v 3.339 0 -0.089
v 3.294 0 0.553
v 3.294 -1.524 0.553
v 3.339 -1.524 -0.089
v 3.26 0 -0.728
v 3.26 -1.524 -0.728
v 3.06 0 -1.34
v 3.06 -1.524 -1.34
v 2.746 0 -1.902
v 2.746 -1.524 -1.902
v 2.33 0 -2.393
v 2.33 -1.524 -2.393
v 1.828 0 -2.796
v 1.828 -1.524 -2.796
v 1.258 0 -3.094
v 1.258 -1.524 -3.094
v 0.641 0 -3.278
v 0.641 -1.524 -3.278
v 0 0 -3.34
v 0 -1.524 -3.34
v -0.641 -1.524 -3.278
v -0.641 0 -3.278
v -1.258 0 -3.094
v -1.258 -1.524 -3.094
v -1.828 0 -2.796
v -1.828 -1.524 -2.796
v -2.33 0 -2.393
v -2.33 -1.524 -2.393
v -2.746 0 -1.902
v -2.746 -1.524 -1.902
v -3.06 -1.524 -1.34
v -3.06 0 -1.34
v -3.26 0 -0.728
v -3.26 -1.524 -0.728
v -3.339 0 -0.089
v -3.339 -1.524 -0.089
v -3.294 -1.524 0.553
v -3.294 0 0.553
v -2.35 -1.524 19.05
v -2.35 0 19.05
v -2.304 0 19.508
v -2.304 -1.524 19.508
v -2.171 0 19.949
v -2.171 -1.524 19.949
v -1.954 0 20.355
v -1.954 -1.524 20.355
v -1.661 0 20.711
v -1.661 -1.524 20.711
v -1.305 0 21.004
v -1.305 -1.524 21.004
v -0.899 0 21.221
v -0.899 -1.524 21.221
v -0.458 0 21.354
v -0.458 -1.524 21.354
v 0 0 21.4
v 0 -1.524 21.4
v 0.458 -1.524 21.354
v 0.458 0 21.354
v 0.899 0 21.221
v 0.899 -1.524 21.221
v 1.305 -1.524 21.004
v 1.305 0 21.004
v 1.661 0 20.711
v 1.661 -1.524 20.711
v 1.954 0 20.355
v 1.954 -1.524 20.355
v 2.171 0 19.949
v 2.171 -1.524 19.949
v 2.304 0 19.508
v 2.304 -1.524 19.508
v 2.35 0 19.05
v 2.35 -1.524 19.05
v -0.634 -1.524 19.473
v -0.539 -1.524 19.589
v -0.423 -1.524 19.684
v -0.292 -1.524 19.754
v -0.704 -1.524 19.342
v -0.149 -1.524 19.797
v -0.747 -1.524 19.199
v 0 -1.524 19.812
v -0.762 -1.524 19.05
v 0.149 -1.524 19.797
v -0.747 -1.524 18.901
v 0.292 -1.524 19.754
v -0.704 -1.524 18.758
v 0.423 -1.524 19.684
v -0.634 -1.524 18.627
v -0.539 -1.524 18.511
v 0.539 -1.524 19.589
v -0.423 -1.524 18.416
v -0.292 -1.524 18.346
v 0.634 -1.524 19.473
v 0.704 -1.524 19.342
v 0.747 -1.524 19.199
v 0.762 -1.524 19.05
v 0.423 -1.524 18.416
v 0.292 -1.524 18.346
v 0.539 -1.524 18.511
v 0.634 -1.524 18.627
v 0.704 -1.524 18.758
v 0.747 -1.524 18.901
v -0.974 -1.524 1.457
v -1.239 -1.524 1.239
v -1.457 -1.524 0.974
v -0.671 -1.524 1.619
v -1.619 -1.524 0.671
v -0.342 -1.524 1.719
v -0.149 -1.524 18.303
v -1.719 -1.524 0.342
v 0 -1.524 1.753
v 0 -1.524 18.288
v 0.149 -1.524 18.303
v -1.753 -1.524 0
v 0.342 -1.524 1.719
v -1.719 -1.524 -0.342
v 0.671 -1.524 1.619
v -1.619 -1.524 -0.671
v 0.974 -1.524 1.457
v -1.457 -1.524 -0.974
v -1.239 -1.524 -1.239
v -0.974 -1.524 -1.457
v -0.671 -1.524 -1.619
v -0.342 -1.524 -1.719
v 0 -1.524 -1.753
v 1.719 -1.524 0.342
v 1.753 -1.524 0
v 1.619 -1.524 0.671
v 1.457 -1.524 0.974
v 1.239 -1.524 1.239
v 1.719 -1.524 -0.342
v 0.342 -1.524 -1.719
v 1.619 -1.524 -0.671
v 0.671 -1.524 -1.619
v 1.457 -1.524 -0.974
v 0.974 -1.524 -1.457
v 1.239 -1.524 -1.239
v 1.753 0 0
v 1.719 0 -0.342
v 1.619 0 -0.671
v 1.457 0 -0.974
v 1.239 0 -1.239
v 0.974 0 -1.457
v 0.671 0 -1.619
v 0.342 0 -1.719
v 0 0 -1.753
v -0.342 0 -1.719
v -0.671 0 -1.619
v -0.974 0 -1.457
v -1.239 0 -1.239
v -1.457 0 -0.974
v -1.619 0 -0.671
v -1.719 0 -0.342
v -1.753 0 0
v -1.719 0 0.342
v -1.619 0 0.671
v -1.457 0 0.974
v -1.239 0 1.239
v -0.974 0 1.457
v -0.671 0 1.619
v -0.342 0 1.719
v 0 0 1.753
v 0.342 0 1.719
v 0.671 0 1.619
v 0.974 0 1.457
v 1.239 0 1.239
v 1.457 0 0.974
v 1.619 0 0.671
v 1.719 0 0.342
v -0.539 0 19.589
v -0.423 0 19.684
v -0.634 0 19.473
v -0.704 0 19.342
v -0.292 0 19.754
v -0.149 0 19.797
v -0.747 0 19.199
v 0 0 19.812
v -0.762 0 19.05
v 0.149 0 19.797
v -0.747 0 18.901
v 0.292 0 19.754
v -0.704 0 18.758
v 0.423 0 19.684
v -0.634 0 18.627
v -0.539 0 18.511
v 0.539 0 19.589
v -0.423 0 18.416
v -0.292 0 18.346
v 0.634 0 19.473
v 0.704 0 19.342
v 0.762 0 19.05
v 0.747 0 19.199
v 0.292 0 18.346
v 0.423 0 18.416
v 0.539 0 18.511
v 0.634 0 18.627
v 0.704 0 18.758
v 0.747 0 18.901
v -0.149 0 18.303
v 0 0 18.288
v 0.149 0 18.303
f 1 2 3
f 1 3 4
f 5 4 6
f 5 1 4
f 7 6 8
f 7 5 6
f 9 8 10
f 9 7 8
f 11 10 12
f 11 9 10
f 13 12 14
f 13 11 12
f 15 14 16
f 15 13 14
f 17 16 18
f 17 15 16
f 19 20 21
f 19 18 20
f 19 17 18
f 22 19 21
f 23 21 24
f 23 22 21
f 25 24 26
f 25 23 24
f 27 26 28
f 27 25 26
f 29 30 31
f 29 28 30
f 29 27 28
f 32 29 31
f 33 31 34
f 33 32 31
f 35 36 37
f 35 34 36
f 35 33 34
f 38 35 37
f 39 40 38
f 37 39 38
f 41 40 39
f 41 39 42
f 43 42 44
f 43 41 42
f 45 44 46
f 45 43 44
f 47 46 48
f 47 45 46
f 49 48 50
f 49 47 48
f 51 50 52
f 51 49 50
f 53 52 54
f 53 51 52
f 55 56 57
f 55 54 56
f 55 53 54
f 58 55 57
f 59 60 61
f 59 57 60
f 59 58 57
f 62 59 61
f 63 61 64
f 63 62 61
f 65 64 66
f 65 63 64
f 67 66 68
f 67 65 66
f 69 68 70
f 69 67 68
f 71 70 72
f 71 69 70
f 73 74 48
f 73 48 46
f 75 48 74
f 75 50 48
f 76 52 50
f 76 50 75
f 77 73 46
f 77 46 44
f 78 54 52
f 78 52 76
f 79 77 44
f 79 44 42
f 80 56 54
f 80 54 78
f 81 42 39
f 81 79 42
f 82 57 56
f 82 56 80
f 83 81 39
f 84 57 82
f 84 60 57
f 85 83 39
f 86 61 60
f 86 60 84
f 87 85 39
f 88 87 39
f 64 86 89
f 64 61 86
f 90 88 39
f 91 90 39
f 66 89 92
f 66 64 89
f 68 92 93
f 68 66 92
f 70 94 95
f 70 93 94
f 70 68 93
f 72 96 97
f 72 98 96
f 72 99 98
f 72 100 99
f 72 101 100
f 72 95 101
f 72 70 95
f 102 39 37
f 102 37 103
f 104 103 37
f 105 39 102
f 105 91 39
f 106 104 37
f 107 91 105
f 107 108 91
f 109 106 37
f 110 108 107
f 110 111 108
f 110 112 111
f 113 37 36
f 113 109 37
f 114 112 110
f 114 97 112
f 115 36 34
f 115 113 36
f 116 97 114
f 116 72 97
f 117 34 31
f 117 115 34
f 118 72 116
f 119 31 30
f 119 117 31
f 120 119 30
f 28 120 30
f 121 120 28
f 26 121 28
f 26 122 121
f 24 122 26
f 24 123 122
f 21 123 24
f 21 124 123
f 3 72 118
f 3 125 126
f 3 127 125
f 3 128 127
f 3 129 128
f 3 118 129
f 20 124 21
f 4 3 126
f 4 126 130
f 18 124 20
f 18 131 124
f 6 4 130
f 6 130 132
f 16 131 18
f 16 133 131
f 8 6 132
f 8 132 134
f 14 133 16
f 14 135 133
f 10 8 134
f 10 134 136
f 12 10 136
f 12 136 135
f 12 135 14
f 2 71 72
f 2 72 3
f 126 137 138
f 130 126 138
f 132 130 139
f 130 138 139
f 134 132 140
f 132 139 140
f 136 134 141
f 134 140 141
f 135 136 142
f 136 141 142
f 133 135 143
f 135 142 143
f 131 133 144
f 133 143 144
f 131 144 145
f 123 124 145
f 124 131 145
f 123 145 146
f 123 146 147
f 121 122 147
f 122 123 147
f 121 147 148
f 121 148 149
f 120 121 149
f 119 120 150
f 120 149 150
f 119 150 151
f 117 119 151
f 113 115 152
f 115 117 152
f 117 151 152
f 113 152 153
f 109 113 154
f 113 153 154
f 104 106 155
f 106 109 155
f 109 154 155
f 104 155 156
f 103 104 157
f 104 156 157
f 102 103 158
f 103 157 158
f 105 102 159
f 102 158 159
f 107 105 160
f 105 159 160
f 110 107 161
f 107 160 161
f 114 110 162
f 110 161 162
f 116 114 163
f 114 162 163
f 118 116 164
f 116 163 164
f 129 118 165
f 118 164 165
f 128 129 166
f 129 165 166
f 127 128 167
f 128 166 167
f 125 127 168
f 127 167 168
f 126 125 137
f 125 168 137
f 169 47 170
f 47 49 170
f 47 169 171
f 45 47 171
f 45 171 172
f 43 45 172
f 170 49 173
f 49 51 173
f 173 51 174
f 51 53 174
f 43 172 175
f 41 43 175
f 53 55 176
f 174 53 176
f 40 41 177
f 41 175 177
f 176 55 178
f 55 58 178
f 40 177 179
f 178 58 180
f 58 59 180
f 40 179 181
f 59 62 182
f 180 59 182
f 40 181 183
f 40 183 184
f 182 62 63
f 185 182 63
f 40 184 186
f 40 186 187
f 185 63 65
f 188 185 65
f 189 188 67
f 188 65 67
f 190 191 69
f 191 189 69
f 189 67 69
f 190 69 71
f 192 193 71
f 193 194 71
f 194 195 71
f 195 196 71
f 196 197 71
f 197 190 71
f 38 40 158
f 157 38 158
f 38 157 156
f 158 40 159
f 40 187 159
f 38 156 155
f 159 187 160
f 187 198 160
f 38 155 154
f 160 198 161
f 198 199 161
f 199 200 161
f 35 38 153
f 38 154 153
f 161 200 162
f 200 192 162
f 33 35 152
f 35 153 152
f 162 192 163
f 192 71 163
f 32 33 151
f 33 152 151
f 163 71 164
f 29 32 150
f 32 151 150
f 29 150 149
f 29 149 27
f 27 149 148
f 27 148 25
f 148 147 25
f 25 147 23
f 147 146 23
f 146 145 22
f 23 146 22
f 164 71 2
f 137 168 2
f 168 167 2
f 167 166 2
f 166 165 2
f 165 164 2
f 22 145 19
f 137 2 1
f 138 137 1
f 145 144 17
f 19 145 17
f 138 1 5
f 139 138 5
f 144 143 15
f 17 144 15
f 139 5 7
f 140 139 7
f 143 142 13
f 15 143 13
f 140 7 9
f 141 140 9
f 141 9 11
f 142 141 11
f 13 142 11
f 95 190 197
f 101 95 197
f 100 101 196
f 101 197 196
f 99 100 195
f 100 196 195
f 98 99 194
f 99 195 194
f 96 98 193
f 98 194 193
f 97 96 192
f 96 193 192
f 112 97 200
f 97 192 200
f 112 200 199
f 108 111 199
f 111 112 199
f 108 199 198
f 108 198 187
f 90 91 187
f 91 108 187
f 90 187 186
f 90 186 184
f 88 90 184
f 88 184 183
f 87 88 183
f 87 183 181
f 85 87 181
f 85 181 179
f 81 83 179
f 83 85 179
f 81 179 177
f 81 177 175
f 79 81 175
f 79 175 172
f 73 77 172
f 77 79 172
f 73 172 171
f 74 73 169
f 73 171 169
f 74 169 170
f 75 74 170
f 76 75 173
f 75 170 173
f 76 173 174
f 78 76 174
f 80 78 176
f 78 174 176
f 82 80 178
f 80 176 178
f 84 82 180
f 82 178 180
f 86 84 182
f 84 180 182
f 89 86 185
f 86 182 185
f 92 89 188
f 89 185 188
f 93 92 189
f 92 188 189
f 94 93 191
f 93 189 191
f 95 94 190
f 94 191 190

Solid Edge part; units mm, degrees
sketch "Sketch1" plane through (0, 0, 0) normal (0, -1, 0) x (1, 0, 0)
  circle A0 centre (0, 19.05) radius 0.762
  line L0 (-2.3495, 19.05) -> (-3.294, 0.5528)
  line L1 (2.3495, 19.05) -> (3.294, 0.5528)
  arc A1 (2.3495, 19.05) -> (-2.3495, 19.05) centre (0, 19.05) ccw
  arc A2 (-3.294, 0.5528) -> (3.294, 0.5528) centre (0, 0) ccw
  circle A3 centre (0, 0) radius 1.7526
extrude "Protrusion1" add sketch "Sketch1" along normal blind 1.524
properties material "Aluminum, 6061-T6"
